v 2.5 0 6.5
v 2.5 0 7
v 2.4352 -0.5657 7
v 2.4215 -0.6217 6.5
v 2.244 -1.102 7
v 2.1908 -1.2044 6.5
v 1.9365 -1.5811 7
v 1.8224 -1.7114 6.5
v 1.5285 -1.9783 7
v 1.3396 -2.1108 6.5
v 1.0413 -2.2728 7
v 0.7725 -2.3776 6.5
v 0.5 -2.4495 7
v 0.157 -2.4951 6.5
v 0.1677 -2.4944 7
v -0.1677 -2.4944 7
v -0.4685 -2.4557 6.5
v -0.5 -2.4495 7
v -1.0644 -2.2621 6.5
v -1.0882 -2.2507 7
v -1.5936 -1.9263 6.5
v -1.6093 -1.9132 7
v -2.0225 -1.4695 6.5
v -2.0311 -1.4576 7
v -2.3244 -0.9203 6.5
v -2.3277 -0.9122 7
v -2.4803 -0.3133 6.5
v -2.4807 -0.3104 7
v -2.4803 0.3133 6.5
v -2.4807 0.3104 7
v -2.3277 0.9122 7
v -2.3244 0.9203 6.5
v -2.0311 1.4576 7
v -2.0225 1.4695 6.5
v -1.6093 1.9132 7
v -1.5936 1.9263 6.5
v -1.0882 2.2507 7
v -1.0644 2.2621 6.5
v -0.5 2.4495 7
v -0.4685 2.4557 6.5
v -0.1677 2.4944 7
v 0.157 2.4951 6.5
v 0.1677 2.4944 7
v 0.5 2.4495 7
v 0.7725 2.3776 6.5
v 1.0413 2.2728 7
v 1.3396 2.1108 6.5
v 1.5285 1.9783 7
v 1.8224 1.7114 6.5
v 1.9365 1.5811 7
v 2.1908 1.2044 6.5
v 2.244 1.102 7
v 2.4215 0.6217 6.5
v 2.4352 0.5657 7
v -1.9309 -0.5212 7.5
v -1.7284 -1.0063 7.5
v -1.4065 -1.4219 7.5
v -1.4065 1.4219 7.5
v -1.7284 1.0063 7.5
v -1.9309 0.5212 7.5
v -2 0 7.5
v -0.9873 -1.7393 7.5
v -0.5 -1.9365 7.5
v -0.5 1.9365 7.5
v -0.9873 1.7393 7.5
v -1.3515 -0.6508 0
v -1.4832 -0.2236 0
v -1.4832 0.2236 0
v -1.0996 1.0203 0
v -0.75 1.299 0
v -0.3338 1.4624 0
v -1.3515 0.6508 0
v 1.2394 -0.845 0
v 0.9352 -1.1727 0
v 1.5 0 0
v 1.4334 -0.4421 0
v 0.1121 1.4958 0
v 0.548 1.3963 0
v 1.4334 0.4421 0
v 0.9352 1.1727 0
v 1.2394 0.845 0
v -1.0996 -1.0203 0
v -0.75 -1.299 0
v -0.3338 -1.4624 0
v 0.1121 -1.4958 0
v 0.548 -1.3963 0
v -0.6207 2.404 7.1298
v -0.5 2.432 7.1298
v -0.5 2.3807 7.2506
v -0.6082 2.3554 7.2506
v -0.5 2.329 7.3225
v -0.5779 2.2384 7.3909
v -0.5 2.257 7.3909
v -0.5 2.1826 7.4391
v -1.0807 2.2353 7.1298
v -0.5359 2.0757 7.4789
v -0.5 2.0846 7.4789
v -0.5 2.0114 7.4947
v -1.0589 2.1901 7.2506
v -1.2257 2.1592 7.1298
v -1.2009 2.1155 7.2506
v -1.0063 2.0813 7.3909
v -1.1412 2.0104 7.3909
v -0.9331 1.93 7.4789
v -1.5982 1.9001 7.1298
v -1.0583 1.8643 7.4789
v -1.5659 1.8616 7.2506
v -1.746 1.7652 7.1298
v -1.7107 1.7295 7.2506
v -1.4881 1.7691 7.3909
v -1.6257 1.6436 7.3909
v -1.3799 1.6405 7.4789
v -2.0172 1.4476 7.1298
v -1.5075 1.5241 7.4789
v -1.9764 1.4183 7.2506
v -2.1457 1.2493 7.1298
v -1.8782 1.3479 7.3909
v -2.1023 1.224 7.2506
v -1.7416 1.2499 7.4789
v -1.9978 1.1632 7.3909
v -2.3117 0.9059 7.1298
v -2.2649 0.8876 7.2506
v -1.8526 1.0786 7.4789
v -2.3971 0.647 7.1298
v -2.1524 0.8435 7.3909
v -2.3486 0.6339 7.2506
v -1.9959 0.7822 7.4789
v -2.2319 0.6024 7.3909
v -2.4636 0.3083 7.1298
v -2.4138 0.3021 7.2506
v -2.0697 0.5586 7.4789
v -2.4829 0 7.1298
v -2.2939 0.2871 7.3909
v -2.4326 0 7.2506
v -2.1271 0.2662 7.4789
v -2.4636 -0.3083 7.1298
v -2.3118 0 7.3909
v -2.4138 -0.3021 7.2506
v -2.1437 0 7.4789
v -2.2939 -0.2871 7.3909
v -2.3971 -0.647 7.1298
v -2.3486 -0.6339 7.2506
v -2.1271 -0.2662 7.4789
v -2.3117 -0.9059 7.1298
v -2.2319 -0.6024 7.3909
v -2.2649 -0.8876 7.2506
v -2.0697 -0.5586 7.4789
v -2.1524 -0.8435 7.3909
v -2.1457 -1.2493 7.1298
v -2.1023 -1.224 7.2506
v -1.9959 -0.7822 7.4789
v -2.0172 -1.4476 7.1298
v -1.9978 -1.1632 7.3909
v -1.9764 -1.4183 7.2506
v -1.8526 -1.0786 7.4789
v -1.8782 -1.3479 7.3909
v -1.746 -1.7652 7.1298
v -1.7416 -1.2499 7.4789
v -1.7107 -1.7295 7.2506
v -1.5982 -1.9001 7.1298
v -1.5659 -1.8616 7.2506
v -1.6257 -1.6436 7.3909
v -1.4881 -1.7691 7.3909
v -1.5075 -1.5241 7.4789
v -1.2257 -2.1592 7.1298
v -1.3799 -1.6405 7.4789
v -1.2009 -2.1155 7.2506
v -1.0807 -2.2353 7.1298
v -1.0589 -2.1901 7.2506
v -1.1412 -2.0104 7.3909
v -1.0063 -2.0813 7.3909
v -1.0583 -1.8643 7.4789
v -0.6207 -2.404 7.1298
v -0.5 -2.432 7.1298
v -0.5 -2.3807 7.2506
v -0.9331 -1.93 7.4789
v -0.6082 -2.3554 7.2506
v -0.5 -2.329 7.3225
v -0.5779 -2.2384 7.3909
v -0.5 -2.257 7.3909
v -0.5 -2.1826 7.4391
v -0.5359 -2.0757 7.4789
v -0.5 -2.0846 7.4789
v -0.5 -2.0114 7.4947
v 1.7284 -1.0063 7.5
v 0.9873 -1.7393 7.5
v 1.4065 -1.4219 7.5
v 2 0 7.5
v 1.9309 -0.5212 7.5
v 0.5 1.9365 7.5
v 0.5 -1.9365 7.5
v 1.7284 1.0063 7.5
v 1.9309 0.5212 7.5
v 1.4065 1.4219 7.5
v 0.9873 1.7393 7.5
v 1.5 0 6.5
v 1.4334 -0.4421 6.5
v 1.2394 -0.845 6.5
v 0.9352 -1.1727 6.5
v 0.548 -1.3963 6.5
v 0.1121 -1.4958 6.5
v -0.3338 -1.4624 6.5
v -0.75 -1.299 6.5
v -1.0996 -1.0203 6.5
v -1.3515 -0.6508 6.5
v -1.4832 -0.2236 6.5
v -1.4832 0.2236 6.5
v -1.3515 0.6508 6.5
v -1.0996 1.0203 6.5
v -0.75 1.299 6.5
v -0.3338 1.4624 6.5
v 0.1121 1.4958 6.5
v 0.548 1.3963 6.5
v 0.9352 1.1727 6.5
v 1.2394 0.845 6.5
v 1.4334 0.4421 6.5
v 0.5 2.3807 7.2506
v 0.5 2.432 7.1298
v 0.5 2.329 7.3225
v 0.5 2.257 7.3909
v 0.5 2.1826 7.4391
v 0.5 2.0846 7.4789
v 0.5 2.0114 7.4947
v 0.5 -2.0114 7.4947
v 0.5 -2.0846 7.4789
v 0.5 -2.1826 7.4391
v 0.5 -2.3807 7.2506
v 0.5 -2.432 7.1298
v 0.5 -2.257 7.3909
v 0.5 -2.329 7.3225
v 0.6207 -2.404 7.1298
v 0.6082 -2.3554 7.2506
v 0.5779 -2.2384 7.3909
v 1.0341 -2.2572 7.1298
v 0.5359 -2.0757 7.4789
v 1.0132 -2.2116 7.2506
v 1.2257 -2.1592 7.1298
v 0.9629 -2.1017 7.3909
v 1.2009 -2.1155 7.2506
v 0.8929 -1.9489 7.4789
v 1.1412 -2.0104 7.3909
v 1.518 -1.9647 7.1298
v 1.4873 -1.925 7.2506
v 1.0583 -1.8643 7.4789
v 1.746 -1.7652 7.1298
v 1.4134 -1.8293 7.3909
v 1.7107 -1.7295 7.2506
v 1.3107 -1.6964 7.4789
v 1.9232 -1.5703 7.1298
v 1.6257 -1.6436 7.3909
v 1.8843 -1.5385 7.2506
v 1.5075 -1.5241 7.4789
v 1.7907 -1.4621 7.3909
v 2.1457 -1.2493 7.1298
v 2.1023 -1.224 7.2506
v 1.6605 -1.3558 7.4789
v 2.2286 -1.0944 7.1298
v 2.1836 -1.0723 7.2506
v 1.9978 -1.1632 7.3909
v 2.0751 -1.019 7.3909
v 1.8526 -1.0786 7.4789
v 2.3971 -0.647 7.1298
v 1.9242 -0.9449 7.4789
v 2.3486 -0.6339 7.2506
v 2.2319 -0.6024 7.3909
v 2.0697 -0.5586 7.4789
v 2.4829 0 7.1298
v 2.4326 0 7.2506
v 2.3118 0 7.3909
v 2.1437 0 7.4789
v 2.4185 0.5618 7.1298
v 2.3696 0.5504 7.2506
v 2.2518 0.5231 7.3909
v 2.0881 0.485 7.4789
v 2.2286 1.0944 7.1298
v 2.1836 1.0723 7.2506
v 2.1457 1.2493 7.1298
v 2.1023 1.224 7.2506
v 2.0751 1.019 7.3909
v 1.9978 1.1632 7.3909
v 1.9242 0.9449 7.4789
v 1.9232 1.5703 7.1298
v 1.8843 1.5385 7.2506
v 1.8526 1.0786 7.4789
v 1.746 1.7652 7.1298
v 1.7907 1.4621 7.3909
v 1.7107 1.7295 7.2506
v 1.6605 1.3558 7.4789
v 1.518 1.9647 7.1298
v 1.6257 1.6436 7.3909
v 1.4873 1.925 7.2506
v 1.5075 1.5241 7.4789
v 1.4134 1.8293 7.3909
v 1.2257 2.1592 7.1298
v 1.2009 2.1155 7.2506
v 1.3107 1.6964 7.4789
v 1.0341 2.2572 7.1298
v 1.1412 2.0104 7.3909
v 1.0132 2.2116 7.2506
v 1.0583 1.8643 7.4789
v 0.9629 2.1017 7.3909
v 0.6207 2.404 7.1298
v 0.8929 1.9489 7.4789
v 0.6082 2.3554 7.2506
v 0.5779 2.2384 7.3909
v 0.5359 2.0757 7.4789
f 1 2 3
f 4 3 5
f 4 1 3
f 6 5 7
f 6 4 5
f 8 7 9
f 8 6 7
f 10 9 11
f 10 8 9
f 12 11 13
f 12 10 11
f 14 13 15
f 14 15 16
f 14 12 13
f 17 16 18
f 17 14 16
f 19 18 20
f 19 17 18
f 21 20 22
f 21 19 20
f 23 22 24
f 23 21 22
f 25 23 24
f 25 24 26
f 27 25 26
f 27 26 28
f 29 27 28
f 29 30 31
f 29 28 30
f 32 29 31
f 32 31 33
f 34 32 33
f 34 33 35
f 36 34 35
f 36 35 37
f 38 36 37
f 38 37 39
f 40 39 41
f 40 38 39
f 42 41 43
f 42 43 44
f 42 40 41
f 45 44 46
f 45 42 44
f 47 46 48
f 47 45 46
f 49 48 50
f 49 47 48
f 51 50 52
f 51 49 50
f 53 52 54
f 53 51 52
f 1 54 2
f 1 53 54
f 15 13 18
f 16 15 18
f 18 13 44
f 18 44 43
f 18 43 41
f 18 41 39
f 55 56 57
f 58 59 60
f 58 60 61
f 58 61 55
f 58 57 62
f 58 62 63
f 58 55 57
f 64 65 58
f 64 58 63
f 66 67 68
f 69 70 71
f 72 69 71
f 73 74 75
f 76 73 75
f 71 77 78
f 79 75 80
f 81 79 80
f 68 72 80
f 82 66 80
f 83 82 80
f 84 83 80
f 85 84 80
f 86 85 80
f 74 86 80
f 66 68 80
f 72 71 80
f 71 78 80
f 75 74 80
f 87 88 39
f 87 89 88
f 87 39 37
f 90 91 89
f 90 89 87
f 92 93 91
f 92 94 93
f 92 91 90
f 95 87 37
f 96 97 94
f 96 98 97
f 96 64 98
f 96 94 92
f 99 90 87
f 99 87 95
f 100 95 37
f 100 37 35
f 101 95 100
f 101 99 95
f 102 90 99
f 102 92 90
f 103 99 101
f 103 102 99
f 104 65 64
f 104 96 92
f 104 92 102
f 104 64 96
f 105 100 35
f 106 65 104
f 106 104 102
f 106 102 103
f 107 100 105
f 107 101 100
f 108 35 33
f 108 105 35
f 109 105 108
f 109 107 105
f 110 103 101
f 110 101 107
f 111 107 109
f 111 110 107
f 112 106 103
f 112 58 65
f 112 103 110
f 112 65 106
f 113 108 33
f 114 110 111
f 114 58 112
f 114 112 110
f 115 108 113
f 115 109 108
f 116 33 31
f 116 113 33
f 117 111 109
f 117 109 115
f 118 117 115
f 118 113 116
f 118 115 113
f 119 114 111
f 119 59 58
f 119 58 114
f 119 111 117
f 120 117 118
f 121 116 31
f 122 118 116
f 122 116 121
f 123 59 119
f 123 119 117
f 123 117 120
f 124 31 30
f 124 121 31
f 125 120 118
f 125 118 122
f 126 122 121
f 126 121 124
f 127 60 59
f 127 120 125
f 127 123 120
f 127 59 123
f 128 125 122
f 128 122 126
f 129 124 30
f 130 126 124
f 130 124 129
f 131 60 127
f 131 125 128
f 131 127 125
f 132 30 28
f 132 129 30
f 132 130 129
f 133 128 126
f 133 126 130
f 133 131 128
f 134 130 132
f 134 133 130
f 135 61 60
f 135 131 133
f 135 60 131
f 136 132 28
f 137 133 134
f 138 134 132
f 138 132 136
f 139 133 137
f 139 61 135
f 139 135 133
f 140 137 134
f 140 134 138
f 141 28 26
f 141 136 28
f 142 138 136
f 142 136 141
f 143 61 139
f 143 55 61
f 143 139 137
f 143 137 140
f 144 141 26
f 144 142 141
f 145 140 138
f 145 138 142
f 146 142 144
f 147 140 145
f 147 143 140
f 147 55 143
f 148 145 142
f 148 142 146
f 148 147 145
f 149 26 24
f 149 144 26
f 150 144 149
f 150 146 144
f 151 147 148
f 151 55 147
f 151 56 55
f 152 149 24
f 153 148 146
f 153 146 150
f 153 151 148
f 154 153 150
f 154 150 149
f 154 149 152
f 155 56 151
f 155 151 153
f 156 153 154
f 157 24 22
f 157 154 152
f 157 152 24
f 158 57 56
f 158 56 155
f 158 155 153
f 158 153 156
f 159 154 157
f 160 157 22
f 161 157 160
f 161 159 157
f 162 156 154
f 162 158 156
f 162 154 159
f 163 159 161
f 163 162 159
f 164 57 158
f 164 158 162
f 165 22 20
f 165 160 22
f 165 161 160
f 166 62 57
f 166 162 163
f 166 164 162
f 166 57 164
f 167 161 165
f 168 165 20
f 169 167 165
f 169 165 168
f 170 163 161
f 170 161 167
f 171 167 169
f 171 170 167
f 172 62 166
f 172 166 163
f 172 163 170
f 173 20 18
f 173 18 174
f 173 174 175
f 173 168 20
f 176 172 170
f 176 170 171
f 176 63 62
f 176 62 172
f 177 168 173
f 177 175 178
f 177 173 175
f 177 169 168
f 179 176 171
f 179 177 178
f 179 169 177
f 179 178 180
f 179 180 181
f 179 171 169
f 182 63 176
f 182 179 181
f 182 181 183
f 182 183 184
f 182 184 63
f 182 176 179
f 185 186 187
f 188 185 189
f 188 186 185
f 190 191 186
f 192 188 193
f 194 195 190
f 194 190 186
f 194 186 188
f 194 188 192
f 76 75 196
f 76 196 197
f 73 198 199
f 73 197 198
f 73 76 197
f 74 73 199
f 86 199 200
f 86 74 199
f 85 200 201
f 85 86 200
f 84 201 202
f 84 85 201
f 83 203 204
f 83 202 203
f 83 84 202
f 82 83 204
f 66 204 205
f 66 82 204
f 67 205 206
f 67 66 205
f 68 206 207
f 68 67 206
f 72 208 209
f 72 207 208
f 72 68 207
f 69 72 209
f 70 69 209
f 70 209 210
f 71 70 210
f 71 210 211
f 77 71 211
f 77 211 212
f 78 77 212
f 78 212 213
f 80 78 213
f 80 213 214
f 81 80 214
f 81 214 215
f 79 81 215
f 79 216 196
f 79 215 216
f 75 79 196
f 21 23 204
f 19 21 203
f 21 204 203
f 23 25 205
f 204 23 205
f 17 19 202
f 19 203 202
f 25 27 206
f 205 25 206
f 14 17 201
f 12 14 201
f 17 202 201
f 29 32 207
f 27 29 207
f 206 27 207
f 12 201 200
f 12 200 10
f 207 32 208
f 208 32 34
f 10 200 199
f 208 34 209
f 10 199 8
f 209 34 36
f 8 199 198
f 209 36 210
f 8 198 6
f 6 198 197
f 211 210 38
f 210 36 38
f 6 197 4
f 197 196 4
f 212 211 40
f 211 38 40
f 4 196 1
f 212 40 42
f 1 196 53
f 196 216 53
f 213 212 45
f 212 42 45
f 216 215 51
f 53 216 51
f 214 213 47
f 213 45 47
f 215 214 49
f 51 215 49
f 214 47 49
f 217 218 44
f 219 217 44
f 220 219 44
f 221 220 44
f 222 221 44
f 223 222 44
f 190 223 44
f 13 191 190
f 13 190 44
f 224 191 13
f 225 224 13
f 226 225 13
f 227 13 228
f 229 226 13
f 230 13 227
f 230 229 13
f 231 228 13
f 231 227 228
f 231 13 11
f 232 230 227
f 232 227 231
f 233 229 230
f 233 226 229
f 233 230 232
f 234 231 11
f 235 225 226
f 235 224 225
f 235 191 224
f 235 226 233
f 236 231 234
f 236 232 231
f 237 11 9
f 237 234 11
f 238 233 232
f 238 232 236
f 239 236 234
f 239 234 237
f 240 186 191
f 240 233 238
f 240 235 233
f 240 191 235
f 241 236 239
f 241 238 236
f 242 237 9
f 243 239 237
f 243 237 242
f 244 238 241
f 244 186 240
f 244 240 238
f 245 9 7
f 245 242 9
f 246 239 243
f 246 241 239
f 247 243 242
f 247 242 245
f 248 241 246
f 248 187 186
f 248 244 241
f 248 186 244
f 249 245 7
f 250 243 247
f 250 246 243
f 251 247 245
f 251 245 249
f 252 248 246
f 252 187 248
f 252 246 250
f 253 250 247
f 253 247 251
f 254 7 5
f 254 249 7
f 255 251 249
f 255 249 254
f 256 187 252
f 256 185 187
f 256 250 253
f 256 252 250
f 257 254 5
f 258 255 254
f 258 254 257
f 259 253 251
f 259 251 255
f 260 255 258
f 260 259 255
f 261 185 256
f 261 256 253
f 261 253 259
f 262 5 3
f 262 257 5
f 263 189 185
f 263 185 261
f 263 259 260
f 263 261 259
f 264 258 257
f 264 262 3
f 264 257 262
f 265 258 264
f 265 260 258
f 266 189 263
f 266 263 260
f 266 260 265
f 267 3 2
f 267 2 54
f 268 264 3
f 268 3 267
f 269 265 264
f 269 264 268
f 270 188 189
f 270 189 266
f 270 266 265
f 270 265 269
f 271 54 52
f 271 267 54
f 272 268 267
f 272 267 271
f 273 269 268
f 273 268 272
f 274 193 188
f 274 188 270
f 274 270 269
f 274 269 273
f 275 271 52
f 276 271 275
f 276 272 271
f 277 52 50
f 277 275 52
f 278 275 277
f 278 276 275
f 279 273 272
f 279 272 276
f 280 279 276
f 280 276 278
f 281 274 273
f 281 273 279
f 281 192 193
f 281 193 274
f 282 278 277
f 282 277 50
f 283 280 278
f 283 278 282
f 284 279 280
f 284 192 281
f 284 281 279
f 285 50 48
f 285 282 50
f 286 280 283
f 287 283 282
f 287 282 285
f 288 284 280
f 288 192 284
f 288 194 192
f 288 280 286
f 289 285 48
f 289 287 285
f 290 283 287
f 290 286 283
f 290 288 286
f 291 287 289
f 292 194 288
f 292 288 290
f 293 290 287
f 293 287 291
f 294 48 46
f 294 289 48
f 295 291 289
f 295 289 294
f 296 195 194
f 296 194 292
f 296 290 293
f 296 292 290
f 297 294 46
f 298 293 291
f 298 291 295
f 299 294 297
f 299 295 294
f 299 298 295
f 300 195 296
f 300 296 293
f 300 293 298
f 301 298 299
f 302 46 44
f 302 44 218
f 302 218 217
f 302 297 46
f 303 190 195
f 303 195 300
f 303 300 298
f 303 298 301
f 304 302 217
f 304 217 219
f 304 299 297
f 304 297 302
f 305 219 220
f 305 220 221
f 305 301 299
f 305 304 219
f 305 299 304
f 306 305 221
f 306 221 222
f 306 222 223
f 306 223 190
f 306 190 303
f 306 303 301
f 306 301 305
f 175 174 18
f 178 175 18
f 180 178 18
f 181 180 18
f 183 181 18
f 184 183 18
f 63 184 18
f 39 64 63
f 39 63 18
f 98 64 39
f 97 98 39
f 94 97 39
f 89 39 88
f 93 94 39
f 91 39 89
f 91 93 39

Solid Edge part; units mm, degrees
sketch "Sketch1" plane through (0, 0, 0) normal (0, 0, 1) x (1, 0, 0)
  circle A0 centre (0, 0) radius 1.5
  dimension "D1" = 3
extrude "Protrusion1" add sketch "Sketch1" along normal blind 6.5
sketch "Sketch2" plane through (0, 0, 6.5) normal (0, 0, 1) x (1, 0, 0)
  circle A0 centre (0, 0) radius 2.5
  dimension "D1" = 5
extrude "Head" add sketch "Sketch2" along normal blind 1
fillet "Round___Head" radius 0.5 1 edges at (-2.5, 0, 7.5)
sketch "Sketch3" plane through (0, 0, 7.5) normal (0, 0, 1) x (1, 0, 0)
  line L0 (-0.5, -2.4495) -> (-0.5, 2.4495)
  line L1 (0.5, 2.4495) -> (0.5, -2.4495)
  arc A0 (0.5, -2.4495) -> (-0.5, -2.4495) centre (0, 0) cw
  arc A1 (-0.5, 2.4495) -> (0.5, 2.4495) centre (0, 0) cw
extrude "Cutout___Head" cut sketch "Sketch3" against normal blind 0.5
cosmetic_thread "Thread1" size "M3"
properties material "Stainless Steel, 420"
